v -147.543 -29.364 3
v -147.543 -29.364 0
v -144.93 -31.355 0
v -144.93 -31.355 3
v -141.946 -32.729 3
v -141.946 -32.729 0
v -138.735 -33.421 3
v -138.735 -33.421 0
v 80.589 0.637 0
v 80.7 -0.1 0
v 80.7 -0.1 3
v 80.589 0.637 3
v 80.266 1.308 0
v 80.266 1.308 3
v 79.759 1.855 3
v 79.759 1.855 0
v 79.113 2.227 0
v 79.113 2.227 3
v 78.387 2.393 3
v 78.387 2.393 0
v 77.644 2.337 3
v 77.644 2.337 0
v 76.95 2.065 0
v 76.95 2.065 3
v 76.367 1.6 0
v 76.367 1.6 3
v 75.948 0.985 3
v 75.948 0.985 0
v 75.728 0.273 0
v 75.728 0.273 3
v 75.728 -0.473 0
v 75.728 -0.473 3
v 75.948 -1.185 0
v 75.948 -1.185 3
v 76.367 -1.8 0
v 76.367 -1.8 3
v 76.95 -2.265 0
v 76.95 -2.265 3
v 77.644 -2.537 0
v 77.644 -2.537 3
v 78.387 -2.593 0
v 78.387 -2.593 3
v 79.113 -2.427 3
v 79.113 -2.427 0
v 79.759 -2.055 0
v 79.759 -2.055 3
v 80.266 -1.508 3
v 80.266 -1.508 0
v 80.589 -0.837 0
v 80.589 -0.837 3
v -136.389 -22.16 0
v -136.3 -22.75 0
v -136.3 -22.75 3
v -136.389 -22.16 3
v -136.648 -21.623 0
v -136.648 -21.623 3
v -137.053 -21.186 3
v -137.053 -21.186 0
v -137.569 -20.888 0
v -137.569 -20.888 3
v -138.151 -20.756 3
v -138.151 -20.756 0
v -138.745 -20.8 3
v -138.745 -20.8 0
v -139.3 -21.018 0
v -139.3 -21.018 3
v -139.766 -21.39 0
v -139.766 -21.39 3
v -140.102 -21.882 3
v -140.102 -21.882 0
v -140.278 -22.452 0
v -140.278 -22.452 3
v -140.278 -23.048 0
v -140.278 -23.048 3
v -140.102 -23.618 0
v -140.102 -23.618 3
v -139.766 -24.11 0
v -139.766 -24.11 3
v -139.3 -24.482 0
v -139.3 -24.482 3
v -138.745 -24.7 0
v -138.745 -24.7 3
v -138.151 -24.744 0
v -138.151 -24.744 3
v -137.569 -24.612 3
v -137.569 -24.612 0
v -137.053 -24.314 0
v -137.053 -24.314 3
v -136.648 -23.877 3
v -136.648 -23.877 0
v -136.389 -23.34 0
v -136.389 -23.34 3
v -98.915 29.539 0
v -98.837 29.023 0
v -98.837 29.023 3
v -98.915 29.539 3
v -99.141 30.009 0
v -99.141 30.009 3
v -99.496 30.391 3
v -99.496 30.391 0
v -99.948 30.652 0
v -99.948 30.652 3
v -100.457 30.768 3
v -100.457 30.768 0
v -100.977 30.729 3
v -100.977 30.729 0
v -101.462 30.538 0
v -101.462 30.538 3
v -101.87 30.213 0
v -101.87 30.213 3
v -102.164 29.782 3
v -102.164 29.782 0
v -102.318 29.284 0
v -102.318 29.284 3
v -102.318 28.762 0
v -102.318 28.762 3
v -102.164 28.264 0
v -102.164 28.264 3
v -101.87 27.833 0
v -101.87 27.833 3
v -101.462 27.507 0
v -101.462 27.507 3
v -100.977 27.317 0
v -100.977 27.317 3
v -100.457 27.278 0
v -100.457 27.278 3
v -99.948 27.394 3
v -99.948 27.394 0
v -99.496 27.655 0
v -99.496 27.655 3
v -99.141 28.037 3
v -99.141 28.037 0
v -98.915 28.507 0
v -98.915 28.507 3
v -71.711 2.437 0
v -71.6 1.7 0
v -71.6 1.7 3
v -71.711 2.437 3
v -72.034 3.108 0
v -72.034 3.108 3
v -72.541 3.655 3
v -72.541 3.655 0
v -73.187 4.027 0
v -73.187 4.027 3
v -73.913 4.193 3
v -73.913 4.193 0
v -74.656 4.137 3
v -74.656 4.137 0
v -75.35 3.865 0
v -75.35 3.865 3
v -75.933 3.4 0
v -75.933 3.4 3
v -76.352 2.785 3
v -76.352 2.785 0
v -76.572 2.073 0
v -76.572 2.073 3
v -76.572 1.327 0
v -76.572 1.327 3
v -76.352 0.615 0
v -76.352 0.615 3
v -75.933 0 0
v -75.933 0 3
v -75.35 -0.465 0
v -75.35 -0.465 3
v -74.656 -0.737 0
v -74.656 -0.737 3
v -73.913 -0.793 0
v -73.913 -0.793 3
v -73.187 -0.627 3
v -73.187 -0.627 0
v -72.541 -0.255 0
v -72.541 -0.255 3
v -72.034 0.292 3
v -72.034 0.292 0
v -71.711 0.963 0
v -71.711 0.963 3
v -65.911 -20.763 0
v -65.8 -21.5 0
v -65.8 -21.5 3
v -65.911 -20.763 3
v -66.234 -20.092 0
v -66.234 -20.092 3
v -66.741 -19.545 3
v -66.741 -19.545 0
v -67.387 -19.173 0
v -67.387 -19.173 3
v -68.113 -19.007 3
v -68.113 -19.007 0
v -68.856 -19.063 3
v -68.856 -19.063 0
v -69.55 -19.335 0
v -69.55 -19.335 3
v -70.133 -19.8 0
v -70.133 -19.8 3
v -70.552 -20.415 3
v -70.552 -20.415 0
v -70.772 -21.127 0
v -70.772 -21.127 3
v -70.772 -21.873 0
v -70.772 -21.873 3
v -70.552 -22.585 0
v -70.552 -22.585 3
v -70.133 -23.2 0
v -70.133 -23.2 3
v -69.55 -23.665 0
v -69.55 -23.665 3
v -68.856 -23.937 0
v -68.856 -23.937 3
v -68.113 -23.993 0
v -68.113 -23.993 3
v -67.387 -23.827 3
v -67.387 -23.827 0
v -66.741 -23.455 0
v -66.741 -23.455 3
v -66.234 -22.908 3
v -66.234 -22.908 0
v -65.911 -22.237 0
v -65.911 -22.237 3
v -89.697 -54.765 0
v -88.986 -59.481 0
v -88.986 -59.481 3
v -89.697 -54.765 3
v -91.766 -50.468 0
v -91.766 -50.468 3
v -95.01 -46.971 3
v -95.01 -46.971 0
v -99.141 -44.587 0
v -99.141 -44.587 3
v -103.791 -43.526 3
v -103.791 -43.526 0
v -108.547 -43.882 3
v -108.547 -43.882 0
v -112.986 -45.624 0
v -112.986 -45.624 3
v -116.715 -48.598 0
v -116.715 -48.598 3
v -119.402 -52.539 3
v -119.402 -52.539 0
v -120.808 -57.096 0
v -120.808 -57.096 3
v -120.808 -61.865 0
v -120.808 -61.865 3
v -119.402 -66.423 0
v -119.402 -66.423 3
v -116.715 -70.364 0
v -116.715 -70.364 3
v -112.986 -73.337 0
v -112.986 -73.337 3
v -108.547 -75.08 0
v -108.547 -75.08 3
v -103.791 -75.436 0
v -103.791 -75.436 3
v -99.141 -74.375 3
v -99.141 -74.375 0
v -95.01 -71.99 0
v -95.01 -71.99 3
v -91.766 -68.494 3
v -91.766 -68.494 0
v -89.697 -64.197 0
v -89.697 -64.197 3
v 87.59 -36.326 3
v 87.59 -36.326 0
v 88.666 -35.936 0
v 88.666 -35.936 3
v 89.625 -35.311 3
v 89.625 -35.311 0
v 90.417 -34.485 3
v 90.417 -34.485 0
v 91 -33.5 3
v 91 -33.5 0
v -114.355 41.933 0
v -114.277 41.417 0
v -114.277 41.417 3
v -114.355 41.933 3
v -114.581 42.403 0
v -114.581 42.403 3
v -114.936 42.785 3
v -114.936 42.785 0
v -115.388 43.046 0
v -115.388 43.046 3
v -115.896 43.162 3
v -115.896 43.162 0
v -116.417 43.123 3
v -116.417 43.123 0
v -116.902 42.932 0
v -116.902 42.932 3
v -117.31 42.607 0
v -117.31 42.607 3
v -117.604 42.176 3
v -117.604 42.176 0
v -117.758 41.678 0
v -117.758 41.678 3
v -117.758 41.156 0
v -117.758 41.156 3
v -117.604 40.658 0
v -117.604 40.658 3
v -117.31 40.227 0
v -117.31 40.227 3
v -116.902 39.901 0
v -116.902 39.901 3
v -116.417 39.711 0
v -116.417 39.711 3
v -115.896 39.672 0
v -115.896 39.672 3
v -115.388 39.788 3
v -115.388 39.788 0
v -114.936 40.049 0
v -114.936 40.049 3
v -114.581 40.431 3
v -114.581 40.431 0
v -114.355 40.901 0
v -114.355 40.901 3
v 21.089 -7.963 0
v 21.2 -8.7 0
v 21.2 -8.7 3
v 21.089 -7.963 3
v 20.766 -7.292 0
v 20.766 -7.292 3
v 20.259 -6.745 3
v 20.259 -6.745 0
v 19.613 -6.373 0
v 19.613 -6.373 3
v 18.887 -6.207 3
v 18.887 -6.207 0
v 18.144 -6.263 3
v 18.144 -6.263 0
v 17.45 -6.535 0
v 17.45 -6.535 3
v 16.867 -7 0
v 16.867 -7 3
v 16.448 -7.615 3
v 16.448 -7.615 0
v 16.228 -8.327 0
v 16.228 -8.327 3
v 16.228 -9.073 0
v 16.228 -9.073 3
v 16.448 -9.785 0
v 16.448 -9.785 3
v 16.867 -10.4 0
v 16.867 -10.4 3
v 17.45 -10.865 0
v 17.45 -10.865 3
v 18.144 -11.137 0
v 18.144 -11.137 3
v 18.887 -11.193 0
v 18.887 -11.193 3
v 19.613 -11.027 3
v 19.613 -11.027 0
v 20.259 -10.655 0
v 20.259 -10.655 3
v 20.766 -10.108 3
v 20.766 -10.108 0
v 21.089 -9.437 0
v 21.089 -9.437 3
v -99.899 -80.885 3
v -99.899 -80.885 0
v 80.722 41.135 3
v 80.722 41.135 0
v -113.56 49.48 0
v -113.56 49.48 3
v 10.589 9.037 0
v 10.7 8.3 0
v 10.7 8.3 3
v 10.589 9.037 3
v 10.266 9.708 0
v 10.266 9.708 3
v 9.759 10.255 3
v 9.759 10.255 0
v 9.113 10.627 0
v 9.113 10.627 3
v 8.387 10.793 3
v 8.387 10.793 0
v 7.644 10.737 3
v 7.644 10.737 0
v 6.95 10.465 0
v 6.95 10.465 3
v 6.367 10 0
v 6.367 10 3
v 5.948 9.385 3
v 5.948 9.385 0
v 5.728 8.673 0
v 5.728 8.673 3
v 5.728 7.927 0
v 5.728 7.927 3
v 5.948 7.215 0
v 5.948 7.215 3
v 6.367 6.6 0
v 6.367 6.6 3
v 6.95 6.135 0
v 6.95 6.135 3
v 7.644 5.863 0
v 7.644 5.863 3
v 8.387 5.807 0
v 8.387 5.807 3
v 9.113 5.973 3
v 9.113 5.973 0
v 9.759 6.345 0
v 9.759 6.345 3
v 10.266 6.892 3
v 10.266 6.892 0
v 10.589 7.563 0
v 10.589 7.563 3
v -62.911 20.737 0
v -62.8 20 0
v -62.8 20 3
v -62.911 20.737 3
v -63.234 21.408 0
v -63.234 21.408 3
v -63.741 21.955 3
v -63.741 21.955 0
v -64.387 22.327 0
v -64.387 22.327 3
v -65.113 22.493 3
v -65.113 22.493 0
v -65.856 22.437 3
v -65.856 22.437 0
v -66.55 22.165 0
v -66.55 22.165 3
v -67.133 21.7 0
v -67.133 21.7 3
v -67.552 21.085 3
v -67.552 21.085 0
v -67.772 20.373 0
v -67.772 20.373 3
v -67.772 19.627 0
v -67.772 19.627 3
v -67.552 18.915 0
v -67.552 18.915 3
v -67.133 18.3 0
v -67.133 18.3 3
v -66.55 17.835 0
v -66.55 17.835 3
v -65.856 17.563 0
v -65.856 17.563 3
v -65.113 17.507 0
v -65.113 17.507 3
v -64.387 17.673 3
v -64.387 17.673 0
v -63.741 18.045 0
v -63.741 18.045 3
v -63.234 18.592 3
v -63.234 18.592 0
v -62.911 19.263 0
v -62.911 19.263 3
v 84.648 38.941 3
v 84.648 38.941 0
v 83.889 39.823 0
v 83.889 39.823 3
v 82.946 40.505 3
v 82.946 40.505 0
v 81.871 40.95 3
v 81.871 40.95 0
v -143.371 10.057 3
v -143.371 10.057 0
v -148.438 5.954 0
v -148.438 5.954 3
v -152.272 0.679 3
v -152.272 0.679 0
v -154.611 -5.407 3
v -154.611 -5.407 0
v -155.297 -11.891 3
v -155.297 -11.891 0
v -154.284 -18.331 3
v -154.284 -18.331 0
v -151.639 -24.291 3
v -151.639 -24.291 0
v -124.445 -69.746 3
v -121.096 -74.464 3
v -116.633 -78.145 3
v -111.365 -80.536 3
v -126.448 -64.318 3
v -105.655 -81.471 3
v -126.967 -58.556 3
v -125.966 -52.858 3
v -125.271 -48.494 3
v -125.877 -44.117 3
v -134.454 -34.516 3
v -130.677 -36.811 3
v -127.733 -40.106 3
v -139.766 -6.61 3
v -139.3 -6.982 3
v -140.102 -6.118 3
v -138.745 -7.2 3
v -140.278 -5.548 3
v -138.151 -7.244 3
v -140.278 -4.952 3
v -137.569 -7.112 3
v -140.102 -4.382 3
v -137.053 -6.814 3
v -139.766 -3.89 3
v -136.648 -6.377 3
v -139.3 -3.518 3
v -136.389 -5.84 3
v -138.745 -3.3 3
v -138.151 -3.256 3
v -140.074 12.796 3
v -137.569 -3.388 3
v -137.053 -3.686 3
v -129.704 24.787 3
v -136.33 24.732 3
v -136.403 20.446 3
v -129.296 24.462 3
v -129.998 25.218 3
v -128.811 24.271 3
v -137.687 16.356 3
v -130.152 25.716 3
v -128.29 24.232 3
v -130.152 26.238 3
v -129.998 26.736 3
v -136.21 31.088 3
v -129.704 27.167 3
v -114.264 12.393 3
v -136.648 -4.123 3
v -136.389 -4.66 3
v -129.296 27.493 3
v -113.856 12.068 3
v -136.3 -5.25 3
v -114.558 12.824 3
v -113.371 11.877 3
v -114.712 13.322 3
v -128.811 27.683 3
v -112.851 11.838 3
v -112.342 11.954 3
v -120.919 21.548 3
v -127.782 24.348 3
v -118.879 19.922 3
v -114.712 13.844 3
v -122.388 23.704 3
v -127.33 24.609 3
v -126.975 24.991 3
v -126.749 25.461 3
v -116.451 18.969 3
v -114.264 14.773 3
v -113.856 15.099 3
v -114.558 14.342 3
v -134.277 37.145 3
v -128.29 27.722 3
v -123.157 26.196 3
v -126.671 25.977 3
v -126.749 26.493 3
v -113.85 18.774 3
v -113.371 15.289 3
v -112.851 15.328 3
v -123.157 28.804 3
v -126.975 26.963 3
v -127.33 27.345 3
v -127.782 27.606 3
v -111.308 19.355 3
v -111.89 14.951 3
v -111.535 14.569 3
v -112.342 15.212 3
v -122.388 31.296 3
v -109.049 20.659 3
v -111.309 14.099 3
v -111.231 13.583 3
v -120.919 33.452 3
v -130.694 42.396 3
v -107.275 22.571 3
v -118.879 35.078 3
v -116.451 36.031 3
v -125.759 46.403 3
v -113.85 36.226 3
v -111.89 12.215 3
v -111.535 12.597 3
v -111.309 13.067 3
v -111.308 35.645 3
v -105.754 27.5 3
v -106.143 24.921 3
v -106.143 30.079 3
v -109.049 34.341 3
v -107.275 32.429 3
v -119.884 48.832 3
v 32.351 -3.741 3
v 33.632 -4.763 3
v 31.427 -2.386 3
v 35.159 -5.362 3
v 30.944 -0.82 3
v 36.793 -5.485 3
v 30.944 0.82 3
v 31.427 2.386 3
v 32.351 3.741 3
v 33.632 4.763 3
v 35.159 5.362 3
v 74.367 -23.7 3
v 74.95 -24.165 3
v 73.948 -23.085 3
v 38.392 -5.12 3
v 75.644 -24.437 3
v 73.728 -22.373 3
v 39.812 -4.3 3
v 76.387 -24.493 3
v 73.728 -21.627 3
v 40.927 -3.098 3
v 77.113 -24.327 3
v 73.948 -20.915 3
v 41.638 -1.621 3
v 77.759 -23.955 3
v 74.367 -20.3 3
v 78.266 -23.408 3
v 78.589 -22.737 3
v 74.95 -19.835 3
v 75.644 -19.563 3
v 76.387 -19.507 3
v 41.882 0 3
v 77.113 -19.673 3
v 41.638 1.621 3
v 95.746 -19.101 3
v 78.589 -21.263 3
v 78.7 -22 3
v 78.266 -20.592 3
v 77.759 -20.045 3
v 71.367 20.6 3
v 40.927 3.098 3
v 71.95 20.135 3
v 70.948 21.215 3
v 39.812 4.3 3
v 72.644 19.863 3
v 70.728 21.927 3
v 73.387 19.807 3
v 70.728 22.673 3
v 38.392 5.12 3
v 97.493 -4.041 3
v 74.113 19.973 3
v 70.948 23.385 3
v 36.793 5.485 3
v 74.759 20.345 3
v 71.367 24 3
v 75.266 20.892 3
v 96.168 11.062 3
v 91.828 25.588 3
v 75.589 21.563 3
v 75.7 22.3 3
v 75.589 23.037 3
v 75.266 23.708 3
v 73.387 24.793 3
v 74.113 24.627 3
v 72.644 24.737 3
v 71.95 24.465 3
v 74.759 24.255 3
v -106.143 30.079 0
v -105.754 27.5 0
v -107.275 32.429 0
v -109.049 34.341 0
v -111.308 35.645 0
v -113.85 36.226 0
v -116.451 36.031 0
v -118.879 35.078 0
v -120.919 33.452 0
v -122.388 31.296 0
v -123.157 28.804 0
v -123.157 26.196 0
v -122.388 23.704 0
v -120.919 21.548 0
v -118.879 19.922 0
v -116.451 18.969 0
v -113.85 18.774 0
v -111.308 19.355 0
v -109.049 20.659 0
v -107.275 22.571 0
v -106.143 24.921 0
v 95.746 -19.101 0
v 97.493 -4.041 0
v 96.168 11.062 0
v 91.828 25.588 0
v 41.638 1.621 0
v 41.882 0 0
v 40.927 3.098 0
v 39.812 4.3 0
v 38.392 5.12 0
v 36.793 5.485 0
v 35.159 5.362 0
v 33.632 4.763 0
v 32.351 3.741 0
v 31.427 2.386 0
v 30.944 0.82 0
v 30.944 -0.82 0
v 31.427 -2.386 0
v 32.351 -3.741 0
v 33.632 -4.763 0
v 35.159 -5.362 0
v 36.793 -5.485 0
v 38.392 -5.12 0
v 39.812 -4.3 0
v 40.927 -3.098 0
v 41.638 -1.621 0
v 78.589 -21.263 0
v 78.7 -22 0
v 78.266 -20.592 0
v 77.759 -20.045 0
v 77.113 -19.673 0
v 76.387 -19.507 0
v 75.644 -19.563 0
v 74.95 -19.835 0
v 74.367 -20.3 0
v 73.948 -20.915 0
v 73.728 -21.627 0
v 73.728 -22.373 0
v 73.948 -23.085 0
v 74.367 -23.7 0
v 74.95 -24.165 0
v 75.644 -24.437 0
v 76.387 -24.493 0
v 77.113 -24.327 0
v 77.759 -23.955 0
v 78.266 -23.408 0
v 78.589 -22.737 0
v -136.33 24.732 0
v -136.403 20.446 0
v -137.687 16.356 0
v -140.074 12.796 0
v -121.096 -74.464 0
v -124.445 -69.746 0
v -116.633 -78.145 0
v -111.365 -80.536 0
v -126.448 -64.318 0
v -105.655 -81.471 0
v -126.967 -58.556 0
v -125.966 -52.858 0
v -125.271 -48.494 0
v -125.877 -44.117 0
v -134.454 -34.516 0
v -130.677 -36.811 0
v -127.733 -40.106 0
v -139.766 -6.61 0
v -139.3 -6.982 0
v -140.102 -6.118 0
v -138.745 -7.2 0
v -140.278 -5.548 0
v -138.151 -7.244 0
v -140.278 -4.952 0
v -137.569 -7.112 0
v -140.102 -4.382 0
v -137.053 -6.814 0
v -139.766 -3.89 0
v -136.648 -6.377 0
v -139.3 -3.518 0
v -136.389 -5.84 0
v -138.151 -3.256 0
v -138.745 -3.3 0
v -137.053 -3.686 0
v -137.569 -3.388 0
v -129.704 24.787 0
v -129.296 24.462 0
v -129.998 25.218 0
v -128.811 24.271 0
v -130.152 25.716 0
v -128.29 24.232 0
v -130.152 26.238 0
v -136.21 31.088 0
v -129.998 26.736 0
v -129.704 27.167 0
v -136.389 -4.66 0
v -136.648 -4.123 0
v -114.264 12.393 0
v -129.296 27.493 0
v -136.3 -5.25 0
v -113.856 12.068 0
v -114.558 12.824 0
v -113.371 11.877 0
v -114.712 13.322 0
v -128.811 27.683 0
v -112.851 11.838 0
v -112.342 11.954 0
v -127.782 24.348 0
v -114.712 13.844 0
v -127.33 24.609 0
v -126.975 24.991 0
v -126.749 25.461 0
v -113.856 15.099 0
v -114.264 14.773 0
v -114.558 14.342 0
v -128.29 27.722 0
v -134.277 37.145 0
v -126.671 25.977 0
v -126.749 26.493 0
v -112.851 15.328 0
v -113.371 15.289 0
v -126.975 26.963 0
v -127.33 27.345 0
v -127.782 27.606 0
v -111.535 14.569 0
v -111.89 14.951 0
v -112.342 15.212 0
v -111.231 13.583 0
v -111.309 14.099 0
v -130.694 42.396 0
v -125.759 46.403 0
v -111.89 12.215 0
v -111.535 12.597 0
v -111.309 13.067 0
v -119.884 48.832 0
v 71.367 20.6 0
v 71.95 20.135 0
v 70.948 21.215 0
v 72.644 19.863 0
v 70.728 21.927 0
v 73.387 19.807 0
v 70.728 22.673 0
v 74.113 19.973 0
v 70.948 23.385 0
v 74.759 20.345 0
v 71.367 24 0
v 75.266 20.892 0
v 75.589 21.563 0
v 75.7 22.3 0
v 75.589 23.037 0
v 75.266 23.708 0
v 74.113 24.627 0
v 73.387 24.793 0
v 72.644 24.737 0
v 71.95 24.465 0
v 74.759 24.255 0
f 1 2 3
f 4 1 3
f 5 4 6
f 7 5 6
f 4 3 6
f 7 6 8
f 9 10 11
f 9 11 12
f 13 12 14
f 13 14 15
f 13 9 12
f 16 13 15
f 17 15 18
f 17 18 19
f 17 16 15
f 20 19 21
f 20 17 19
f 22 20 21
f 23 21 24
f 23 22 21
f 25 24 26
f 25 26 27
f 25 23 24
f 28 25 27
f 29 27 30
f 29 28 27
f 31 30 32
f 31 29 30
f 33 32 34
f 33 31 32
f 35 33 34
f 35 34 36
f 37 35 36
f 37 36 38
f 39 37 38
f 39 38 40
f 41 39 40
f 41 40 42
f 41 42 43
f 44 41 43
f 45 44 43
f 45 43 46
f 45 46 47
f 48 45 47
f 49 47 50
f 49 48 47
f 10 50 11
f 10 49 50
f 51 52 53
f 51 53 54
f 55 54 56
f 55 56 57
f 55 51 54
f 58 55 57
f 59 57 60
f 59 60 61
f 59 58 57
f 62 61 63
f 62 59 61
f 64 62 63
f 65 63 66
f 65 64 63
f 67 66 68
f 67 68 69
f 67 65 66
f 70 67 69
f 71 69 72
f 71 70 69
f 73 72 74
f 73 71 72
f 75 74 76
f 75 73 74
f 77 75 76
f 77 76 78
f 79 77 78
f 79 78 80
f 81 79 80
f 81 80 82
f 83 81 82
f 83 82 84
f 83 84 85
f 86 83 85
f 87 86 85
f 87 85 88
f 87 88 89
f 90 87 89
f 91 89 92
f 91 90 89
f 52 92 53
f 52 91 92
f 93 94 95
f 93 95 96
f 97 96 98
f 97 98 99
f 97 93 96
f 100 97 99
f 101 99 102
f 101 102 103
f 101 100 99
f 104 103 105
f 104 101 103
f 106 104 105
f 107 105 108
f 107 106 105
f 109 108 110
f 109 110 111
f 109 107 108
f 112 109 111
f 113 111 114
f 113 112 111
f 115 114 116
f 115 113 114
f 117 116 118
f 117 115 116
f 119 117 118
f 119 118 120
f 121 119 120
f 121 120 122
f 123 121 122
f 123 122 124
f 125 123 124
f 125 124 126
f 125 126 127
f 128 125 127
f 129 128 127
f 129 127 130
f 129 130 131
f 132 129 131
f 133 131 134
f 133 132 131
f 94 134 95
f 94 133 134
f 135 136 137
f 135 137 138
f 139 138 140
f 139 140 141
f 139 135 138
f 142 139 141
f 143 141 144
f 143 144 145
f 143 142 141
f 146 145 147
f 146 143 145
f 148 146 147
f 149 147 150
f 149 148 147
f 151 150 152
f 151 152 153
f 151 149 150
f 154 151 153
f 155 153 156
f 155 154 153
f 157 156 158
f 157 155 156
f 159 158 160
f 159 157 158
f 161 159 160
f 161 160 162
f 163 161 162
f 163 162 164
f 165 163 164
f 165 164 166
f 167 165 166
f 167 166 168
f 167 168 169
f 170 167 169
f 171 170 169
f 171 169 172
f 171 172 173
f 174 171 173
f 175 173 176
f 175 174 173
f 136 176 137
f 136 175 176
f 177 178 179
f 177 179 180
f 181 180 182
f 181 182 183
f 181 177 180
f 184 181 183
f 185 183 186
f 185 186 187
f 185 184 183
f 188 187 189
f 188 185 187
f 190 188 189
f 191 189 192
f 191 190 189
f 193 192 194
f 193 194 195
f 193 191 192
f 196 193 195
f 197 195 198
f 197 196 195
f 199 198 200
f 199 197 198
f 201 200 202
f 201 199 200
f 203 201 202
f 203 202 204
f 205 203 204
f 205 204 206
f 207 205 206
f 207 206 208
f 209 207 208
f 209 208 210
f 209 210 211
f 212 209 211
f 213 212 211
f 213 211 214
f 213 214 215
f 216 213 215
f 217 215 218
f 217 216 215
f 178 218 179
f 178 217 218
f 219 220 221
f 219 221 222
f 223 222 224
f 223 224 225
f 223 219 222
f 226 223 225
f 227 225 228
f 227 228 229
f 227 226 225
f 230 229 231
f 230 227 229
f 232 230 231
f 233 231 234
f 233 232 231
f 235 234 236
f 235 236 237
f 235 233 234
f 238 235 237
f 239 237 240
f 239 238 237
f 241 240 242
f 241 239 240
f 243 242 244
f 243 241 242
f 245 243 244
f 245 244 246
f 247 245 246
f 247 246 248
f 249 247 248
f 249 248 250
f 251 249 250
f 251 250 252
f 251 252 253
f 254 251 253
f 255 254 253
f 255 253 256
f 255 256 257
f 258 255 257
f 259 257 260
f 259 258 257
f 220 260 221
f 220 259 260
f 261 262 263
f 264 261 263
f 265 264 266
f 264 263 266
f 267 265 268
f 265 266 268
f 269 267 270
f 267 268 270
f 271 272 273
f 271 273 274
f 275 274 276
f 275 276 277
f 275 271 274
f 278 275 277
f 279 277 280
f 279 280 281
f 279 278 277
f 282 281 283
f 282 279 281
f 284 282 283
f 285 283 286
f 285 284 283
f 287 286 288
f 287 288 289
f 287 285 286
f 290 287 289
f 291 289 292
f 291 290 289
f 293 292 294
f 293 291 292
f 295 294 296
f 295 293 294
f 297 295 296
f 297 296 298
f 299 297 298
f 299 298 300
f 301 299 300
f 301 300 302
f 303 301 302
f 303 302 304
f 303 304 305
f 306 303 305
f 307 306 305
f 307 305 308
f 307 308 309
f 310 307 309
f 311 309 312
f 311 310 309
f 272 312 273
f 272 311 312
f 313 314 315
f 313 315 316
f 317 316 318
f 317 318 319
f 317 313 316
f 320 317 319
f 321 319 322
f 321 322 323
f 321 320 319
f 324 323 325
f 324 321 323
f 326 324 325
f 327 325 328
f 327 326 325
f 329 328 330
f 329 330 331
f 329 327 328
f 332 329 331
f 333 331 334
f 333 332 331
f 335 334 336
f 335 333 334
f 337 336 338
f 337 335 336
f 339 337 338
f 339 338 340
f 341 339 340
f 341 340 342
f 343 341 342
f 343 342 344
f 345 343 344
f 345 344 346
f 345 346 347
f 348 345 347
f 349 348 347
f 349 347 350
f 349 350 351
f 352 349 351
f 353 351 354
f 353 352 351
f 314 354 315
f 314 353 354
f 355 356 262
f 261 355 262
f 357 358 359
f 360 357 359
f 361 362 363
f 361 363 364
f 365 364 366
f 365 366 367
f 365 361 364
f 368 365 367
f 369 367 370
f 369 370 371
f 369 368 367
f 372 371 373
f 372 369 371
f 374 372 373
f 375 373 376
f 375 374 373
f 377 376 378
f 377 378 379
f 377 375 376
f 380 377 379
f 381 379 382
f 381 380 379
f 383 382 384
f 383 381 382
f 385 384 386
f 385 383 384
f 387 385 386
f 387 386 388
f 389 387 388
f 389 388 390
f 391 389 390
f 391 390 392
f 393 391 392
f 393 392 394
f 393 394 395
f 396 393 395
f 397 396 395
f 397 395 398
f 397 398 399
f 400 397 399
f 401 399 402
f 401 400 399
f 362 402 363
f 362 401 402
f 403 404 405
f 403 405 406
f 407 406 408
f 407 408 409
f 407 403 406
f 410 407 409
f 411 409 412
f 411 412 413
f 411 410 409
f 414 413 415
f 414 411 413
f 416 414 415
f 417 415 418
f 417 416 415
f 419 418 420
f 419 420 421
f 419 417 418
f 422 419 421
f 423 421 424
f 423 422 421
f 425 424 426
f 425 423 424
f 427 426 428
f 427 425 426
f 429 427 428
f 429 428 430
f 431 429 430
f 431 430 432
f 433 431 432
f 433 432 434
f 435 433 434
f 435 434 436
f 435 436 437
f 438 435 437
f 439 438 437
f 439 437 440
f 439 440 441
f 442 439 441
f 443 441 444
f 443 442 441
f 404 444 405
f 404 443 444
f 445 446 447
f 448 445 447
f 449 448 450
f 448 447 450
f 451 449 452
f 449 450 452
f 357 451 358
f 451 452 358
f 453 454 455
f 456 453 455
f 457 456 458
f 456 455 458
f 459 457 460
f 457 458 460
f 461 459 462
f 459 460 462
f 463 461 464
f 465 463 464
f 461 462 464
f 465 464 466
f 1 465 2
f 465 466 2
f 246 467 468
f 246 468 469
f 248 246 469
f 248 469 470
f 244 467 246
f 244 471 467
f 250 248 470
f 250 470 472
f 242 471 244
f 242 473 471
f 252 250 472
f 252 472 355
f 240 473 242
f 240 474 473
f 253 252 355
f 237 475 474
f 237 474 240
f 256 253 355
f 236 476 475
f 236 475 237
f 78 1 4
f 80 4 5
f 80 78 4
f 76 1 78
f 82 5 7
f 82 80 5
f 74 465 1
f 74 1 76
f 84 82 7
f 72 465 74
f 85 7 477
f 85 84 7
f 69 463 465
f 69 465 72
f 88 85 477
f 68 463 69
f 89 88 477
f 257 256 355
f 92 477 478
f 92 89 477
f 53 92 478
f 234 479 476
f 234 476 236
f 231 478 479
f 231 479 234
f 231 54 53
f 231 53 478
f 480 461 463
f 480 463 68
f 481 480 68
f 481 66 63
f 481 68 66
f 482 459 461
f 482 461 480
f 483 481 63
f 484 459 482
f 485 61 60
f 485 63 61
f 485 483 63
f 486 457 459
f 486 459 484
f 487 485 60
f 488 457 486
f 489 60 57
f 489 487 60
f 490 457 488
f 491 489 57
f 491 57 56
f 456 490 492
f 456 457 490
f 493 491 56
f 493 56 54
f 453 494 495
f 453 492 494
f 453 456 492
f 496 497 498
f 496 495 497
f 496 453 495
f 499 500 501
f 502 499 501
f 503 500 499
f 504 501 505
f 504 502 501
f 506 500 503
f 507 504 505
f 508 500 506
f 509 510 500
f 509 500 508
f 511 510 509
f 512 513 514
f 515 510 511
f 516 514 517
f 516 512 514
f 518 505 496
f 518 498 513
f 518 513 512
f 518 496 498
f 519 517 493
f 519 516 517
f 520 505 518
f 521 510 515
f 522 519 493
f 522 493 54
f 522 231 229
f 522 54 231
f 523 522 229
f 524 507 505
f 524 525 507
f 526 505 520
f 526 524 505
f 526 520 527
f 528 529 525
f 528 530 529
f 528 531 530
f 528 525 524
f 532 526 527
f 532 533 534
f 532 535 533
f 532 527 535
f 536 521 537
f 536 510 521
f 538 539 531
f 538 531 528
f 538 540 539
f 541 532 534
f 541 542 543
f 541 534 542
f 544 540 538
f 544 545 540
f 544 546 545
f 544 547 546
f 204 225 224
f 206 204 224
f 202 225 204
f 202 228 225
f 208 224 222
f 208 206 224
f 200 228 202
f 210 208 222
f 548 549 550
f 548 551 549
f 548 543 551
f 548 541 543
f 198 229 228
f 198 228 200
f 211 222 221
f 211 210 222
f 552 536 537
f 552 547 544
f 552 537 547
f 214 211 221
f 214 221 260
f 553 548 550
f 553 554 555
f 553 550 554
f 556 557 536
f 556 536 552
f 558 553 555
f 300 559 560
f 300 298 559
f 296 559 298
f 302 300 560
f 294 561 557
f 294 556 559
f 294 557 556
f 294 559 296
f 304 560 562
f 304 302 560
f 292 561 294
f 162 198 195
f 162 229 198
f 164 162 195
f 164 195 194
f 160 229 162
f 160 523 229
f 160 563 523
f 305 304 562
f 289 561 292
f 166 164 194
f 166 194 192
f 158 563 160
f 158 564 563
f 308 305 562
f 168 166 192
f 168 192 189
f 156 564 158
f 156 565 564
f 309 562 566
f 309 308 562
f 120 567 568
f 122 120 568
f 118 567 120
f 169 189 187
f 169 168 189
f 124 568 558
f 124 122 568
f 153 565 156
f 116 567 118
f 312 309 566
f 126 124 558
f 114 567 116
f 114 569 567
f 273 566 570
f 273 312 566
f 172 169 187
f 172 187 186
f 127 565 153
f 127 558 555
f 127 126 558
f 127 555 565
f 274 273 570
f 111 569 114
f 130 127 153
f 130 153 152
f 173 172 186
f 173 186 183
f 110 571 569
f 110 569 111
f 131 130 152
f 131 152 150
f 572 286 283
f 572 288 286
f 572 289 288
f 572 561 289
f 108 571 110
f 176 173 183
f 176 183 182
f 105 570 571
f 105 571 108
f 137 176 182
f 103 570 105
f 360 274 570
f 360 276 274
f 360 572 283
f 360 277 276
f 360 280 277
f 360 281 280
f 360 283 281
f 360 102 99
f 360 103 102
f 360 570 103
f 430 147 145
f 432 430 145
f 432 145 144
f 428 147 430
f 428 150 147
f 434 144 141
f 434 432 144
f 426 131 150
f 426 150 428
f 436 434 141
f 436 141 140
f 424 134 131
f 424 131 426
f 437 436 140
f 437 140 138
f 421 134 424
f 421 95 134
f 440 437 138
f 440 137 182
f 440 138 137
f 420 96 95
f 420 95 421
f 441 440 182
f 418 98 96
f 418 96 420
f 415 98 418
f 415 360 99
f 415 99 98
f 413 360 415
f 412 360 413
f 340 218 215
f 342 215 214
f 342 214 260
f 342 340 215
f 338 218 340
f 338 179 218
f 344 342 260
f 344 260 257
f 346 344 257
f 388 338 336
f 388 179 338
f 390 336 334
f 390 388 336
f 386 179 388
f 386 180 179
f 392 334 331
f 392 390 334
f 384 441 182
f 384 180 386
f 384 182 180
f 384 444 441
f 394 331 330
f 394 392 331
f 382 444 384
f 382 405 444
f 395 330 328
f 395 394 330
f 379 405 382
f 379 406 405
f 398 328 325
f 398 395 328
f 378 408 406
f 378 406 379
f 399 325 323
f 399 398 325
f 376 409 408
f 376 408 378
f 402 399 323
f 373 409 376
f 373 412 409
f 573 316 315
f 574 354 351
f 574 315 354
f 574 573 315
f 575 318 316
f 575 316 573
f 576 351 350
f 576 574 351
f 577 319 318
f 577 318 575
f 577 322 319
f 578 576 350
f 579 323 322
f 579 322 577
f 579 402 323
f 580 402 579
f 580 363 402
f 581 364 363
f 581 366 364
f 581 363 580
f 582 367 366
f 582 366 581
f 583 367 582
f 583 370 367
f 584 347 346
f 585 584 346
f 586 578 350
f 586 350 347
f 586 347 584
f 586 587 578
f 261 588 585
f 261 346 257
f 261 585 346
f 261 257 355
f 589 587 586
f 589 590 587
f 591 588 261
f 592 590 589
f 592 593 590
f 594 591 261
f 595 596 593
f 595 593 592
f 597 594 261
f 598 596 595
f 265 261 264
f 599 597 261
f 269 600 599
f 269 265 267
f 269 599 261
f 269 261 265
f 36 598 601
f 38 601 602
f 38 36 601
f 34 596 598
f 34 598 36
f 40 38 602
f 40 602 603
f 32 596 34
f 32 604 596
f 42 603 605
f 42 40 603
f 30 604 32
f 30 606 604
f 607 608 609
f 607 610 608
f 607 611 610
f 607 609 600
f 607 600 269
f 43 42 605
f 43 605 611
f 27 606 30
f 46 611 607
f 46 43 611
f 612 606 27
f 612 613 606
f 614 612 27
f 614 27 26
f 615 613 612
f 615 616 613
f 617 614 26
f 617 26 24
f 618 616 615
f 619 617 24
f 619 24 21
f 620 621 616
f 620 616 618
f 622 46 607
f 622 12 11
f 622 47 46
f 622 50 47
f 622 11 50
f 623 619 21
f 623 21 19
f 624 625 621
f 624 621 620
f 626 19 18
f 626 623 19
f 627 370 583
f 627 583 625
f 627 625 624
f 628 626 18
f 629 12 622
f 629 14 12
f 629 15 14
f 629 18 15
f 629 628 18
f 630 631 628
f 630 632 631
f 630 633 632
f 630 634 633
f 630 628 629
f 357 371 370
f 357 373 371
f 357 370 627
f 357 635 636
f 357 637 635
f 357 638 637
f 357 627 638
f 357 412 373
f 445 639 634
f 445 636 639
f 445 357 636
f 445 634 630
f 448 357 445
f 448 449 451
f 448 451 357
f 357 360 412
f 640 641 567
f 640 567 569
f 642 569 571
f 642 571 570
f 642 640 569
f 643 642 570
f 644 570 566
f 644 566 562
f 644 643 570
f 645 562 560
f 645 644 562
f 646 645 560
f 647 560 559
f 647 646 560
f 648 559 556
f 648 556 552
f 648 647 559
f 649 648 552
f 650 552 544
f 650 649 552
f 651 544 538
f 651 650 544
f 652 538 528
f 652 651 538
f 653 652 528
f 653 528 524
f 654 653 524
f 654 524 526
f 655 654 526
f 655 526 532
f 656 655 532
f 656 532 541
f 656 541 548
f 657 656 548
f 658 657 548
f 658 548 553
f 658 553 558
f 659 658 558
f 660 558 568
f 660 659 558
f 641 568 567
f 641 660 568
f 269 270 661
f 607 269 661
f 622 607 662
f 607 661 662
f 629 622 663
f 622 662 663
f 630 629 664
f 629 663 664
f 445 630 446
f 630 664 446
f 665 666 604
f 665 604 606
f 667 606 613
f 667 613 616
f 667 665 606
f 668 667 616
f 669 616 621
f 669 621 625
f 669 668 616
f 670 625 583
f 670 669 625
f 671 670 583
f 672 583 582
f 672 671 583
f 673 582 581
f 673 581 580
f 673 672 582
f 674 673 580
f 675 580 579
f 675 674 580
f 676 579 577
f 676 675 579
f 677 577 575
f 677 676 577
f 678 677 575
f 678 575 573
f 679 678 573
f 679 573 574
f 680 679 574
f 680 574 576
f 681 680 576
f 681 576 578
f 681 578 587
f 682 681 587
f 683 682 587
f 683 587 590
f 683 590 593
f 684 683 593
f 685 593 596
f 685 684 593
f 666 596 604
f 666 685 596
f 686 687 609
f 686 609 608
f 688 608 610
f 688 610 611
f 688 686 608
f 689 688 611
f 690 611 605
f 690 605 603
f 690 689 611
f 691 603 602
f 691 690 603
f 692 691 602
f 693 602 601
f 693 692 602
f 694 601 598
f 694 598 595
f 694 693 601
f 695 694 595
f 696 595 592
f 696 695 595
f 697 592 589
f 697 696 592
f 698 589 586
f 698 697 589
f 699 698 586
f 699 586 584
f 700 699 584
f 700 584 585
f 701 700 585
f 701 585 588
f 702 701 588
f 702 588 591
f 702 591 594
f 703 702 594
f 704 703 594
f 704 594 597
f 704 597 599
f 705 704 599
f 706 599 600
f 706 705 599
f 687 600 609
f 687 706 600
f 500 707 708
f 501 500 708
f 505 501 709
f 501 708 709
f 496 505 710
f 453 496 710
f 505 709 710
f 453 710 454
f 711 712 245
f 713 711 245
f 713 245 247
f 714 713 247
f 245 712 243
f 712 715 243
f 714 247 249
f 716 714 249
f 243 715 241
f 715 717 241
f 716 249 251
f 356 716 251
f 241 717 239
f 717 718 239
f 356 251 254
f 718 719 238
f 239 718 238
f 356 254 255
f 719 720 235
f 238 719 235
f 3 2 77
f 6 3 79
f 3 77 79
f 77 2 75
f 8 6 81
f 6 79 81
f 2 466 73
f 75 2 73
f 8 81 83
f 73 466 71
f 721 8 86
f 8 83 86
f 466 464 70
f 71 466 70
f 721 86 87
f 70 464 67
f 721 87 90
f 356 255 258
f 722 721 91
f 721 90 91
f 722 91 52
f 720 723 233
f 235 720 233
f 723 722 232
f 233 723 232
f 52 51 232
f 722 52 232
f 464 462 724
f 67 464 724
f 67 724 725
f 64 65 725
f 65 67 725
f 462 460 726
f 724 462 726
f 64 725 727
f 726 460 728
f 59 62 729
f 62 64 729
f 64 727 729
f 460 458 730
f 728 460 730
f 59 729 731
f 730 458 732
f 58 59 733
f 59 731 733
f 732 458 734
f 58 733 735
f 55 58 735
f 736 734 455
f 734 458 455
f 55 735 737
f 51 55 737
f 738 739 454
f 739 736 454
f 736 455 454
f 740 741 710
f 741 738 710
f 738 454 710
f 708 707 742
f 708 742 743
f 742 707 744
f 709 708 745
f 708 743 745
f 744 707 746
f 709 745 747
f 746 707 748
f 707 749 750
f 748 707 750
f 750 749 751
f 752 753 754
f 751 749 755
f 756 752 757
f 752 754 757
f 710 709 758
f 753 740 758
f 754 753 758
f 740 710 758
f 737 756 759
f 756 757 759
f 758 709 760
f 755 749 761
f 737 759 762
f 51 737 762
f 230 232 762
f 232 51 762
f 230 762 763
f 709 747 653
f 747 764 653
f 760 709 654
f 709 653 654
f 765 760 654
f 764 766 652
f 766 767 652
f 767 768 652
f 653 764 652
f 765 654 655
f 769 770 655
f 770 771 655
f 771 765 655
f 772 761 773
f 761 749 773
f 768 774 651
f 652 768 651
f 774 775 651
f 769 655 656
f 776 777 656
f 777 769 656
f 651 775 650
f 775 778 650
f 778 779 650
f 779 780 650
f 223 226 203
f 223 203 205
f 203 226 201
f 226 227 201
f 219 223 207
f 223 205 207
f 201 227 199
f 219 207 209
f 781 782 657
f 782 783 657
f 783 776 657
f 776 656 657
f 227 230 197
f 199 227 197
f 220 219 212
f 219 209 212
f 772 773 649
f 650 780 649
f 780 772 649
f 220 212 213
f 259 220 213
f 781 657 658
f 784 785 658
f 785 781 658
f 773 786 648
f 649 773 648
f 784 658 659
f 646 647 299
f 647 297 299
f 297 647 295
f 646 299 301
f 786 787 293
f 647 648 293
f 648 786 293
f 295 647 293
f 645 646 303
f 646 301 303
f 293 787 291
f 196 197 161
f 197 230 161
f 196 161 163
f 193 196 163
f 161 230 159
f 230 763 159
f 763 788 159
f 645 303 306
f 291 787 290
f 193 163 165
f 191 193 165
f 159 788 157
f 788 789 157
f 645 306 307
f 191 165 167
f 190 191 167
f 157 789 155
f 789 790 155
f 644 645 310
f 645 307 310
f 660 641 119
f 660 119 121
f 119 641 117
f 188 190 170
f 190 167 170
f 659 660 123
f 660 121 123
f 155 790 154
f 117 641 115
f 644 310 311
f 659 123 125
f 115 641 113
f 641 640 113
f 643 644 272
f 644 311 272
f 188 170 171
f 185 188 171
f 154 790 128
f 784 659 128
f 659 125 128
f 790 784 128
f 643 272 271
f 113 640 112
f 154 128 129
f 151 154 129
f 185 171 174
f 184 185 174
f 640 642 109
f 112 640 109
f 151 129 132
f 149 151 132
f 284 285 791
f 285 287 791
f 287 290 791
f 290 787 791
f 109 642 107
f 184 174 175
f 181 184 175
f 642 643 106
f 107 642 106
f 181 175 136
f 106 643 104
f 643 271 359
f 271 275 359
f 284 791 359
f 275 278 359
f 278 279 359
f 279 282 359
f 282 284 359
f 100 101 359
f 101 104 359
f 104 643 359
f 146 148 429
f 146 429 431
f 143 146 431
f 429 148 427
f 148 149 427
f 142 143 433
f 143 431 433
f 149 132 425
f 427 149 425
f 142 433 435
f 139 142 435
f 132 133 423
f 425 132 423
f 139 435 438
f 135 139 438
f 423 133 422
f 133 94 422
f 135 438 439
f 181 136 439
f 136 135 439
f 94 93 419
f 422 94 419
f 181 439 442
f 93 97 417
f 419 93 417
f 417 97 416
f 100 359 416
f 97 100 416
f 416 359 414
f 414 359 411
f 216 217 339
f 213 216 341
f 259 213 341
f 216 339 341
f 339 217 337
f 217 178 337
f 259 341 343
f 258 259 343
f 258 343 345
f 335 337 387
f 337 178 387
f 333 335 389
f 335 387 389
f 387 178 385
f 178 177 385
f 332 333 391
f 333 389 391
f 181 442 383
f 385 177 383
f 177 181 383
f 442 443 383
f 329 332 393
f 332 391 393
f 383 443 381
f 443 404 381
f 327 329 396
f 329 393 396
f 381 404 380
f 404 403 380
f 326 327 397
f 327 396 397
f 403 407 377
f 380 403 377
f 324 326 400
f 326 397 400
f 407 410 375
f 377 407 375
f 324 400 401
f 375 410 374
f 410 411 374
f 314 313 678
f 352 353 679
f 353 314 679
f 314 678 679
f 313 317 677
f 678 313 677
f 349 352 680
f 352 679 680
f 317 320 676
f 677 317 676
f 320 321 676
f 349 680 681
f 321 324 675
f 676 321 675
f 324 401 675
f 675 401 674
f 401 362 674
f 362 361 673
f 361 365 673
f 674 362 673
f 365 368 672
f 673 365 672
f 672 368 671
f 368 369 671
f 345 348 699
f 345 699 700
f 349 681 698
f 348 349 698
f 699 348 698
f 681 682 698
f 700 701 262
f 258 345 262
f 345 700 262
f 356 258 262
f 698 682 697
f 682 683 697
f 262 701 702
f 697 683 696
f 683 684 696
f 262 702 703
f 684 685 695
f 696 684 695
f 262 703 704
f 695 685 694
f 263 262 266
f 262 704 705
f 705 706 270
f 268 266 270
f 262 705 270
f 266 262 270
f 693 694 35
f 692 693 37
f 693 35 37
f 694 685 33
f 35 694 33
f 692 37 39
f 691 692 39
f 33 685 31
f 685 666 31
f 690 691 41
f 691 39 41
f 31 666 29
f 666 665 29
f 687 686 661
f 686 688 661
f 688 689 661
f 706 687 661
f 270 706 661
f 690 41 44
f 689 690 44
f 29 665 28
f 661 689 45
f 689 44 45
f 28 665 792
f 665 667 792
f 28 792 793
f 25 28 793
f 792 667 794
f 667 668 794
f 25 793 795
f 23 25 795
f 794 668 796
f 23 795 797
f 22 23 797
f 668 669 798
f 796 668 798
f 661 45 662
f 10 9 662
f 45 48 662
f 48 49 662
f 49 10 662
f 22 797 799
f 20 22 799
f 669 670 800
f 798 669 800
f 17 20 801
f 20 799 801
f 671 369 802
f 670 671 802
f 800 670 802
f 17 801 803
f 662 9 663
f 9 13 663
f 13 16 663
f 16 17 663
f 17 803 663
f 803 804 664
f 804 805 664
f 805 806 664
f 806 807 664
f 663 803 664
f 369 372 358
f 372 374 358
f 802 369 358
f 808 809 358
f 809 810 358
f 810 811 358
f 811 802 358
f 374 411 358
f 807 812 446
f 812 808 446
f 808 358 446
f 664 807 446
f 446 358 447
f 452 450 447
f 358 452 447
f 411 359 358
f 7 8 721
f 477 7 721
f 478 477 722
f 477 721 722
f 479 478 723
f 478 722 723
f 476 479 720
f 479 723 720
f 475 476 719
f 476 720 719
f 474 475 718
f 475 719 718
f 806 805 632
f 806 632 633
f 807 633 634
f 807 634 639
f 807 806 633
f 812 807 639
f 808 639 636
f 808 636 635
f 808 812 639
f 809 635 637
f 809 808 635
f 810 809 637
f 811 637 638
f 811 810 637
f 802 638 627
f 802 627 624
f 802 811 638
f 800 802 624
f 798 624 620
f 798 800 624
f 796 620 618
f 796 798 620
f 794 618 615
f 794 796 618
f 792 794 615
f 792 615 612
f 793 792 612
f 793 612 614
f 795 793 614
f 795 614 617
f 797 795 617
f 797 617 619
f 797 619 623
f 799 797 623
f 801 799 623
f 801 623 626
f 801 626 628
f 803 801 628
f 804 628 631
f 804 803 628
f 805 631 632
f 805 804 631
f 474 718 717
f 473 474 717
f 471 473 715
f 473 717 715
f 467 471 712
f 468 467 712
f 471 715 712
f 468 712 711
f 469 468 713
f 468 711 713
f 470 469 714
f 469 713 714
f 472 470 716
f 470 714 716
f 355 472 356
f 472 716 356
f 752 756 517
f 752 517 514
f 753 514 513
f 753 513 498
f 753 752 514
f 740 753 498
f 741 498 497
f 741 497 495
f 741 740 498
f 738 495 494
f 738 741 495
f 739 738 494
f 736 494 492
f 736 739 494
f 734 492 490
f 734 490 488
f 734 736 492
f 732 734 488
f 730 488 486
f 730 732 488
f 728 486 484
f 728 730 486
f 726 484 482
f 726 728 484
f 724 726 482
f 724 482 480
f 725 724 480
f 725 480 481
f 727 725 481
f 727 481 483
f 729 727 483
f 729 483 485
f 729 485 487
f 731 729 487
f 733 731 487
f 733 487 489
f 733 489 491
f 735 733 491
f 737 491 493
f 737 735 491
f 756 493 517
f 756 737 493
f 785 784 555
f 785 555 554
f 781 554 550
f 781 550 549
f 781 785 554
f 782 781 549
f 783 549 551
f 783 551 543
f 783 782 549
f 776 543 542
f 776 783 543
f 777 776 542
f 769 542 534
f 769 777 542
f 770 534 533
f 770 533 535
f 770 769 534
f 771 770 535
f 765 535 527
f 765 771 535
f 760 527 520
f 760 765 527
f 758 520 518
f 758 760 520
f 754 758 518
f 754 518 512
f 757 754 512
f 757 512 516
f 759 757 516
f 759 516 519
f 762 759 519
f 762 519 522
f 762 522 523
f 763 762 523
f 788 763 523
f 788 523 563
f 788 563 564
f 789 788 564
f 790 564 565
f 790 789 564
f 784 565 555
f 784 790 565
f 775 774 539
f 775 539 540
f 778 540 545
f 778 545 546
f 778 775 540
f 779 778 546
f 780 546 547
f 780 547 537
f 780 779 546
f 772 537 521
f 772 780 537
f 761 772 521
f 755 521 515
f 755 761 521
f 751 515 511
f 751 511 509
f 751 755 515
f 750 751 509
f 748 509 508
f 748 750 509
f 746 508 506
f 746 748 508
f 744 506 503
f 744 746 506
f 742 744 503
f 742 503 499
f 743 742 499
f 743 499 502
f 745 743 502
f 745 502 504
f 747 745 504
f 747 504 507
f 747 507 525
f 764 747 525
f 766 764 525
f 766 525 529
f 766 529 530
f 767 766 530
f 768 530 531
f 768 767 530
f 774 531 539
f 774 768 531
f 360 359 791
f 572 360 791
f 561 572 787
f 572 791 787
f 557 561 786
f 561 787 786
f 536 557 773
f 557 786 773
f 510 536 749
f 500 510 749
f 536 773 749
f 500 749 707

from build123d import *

# Parameters (mm, degrees)
SKETCH1_R           = 2
SKETCH1_R_2         = 2.5
SKETCH1_R_3         = 5.5
SKETCH1_R_4         = 1.75
SKETCH1_R_5         = 8.75
SKETCH1_R_6         = 16
BOSS_EXTRUDE1_DEPTH = 3


with BuildPart() as part:
    # Sketch1 → Boss-Extrude1 (new body)
    with BuildSketch(Plane.XY):
        with BuildLine():
            ThreePointArc((-113.560266524, 49.479735972), (-130.694234864, 42.395842918), (-136.329525131, 24.732380193))
            ThreePointArc((-136.329525131, 24.732380193), (-137.686520221, 16.356467092), (-143.370984404, 10.056925608))
            ThreePointArc((-143.370984404, 10.056925608), (-155.166532009, -8.626129333), (-147.542861296, -29.364285714))
            ThreePointArc((-147.542861296, -29.364285714), (-143.475887893, -32.124161339), (-138.735140925, -33.421275181))
            ThreePointArc((-138.735140925, -33.421275181), (-127.733357788, -40.106373668), (-125.965715234, -52.858048609))
            ThreePointArc((-125.965715234, -52.858048609), (-121.095745986, -74.463536322), (-99.899442585, -80.88462828))
            Line((-99.899442585, -80.88462828), (87.590338172, -36.326384859))
            ThreePointArc((87.590338172, -36.326384859), (89.625170423, -35.311295666), (91, -33.5))
            ThreePointArc((91, -33.5), (97.213976906, 3.543991621), (84.648444567, 38.941424032))
            ThreePointArc((84.648444567, 38.941424032), (82.945648013, 40.504860181), (80.721588123, 41.135261877))
            Line((80.721588123, 41.135261877), (-113.560266524, 49.479735972))
        make_face()
        with Locations((-138.3, -22.75)):
            Circle(SKETCH1_R, mode=Mode.SUBTRACT)
        with Locations((-68.3, -21.5)):
            Circle(SKETCH1_R_2, mode=Mode.SUBTRACT)
        with Locations((-138.3, -5.25)):
            Circle(SKETCH1_R, mode=Mode.SUBTRACT)
        with Locations((-74.1, 1.7)):
            Circle(SKETCH1_R_2, mode=Mode.SUBTRACT)
        with Locations((18.7, -8.7)):
            Circle(SKETCH1_R_2, mode=Mode.SUBTRACT)
        with Locations((76.2, -22)):
            Circle(SKETCH1_R_2, mode=Mode.SUBTRACT)
        with Locations((8.2, 8.3)):
            Circle(SKETCH1_R_2, mode=Mode.SUBTRACT)
        with Locations((36.382449965, 0)):
            Circle(SKETCH1_R_3, mode=Mode.SUBTRACT)
        with Locations((78.2, -0.1)):
            Circle(SKETCH1_R_2, mode=Mode.SUBTRACT)
        with Locations((-112.981409671, 13.583075301)):
            Circle(SKETCH1_R_4, mode=Mode.SUBTRACT)
        with Locations((-128.421228626, 25.977105744)):
            Circle(SKETCH1_R_4, mode=Mode.SUBTRACT)
        with Locations((-65.3, 20)):
            Circle(SKETCH1_R_2, mode=Mode.SUBTRACT)
        with Locations((-114.504303927, 27.5)):
            Circle(SKETCH1_R_5, mode=Mode.SUBTRACT)
        with Locations((-100.587379227, 29.022894256)):
            Circle(SKETCH1_R_4, mode=Mode.SUBTRACT)
        with Locations((-116.027198182, 41.416924699)):
            Circle(SKETCH1_R_4, mode=Mode.SUBTRACT)
        with Locations((73.2, 22.3)):
            Circle(SKETCH1_R_2, mode=Mode.SUBTRACT)
        with Locations((-104.986214828, -59.480779371)):
            Circle(SKETCH1_R_6, mode=Mode.SUBTRACT)
    extrude(amount=BOSS_EXTRUDE1_DEPTH)


solid = part.part
